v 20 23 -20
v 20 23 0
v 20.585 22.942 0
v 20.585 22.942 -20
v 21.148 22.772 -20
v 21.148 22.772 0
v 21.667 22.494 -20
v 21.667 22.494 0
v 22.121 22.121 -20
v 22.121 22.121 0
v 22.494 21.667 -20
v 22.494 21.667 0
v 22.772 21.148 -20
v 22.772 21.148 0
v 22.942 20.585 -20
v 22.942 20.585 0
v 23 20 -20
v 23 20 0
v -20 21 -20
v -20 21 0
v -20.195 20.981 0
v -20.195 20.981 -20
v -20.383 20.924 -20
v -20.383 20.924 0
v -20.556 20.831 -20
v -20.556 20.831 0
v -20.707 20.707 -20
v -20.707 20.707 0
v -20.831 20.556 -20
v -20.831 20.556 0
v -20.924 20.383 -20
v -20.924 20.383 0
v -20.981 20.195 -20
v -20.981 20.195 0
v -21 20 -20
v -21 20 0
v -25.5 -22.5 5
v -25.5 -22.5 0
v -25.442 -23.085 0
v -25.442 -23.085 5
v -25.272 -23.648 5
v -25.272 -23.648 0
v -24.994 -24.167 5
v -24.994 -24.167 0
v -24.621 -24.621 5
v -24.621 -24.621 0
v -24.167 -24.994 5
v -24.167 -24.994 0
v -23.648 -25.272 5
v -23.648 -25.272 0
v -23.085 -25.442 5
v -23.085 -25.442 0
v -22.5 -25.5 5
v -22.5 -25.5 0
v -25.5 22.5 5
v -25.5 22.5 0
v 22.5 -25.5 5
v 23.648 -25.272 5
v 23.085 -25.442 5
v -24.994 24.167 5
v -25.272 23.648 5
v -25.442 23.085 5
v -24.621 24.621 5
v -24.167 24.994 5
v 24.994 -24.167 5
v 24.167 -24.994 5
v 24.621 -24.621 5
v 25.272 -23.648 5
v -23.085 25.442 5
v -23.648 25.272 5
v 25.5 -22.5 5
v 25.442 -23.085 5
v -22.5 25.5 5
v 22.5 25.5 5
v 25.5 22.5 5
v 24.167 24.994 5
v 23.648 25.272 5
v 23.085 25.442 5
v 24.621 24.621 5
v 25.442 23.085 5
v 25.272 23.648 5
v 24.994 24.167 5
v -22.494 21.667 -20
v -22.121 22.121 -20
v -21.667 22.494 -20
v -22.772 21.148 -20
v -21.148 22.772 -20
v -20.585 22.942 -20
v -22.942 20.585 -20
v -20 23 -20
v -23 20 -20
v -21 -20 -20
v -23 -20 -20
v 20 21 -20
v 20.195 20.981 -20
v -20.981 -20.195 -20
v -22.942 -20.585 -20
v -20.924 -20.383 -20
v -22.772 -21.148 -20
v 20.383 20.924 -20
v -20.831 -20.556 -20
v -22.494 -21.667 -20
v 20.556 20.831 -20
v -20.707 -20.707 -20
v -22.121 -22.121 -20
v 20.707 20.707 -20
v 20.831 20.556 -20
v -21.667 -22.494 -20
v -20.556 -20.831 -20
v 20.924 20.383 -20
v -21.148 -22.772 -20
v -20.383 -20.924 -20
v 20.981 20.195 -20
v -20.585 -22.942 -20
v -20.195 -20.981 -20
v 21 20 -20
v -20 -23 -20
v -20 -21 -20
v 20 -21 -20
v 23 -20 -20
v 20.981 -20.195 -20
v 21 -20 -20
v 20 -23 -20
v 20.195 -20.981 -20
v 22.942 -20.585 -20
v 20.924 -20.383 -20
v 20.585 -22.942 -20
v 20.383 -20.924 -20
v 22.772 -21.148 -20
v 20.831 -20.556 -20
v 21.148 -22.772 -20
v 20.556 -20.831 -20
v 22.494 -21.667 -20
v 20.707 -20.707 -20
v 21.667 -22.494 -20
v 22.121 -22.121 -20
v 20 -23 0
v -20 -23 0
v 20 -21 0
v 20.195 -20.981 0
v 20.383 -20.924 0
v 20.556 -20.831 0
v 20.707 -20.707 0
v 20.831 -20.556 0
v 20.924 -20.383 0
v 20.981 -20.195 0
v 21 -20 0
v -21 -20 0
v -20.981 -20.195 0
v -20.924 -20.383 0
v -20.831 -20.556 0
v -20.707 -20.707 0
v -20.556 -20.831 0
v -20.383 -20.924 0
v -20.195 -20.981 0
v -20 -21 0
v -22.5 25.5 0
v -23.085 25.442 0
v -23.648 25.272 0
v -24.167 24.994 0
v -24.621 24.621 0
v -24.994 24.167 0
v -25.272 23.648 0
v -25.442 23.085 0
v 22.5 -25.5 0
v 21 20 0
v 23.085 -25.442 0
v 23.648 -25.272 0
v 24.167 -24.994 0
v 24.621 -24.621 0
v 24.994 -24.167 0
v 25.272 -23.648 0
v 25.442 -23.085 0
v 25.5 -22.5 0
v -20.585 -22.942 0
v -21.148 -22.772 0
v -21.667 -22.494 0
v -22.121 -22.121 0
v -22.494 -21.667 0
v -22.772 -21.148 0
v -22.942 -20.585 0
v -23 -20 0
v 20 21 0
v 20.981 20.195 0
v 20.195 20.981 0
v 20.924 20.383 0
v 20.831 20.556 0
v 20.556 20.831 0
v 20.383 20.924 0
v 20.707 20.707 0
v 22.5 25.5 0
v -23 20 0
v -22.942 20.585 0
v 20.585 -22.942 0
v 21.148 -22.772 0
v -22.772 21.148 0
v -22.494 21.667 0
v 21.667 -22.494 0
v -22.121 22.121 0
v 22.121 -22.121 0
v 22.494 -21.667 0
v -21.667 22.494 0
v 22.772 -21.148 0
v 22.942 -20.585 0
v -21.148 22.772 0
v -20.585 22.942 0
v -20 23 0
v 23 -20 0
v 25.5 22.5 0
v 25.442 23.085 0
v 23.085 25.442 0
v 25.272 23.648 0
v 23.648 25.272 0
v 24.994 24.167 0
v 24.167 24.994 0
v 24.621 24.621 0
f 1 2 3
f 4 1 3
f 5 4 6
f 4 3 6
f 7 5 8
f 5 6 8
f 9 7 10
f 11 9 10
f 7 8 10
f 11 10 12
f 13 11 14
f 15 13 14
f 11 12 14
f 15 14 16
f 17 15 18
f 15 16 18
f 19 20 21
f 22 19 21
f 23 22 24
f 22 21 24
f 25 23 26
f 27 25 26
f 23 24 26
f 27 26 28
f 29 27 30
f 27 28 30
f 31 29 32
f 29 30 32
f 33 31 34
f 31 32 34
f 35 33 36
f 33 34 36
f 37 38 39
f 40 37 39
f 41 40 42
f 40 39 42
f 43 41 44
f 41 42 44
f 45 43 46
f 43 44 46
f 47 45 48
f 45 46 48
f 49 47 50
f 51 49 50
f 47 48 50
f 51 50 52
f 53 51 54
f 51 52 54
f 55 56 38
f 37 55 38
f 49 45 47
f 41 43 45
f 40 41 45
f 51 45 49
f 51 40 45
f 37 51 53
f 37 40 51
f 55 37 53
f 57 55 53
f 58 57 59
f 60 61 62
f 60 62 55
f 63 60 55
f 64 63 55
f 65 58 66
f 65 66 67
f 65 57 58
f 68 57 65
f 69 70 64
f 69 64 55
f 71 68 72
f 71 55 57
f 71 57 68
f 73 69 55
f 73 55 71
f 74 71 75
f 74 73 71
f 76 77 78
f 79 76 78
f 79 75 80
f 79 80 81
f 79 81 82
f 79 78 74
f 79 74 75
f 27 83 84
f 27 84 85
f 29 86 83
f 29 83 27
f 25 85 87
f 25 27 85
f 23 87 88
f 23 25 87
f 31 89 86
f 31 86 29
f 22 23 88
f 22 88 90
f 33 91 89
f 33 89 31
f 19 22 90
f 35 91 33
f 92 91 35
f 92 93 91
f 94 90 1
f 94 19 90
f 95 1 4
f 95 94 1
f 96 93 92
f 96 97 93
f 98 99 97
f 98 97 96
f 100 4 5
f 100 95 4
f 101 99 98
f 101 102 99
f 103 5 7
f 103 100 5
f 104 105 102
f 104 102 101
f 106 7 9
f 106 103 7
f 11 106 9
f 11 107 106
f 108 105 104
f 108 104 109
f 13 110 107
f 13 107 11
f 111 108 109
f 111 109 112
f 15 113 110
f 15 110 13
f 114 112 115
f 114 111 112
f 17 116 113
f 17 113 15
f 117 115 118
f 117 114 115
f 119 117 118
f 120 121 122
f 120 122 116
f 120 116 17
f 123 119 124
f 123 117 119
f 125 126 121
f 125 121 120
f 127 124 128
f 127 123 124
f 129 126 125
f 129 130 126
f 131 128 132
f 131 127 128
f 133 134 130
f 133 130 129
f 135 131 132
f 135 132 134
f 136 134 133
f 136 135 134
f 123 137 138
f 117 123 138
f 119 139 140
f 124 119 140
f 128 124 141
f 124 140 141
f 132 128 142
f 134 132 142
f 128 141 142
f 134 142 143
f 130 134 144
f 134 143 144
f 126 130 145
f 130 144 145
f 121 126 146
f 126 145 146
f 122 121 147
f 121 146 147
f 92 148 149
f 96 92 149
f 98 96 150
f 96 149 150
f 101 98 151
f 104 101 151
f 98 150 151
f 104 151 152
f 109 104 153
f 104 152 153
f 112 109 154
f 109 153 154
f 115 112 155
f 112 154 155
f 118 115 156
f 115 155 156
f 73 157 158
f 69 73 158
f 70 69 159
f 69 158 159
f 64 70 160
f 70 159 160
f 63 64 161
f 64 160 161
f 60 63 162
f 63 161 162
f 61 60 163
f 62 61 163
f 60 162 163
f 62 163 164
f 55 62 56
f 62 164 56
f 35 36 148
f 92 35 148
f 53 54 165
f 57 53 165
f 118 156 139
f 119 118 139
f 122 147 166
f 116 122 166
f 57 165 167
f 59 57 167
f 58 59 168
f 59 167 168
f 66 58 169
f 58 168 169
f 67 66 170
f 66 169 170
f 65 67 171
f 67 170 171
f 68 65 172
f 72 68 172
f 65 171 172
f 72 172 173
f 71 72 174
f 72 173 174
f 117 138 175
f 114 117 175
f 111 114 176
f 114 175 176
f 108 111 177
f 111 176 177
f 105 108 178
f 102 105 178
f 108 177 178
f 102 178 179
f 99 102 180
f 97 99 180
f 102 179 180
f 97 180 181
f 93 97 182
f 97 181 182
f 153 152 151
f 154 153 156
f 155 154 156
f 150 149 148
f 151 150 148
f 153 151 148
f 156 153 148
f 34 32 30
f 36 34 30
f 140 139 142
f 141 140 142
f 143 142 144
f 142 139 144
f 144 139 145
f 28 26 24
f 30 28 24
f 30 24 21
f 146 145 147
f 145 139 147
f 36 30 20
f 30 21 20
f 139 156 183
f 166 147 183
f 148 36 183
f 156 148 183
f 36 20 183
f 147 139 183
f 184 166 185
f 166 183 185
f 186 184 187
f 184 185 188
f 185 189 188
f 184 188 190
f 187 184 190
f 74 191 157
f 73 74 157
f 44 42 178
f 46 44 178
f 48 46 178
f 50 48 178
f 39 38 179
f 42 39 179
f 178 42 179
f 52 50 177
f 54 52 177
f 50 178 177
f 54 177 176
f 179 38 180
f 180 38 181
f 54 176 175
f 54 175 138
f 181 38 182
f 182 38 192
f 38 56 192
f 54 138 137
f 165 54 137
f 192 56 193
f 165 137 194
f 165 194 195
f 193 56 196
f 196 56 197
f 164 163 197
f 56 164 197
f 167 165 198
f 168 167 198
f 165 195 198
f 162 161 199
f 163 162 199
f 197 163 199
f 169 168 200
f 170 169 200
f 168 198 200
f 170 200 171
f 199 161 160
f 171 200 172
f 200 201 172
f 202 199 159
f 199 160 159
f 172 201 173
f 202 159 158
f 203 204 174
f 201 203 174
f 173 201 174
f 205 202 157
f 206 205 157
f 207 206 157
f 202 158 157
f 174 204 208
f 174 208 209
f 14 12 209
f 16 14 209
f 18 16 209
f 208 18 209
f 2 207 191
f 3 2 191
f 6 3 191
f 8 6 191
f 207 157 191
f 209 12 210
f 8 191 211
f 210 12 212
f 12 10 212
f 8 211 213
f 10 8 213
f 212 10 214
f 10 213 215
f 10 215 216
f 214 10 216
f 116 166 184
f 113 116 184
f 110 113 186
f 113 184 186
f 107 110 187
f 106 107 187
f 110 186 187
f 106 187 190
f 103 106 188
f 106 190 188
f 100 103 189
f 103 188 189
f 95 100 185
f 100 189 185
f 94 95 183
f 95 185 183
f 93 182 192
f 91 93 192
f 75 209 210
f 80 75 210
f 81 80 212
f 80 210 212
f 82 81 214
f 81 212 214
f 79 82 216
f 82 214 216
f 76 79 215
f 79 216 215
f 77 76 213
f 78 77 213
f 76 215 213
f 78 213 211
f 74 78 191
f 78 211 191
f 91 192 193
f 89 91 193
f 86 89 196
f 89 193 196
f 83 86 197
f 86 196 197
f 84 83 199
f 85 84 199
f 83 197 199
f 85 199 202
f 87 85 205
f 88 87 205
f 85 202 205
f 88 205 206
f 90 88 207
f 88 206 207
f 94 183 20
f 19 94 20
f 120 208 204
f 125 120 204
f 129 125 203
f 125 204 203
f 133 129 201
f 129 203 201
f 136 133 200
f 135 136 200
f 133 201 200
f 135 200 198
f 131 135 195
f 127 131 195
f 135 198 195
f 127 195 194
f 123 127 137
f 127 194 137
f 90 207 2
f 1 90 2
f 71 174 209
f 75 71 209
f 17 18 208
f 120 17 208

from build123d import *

# Parameters (mm, degrees)
F1_DEPTH = 5
F3_DEPTH = 20


with BuildPart() as f1:
    # F0 (on Top) → F1 (new body)
    with BuildSketch(Plane.XY):
        with BuildLine():
            ThreePointArc((-25.5, -22.5), (-24.62132, -24.62132), (-22.5, -25.5))
            Line((-22.5, -25.5), (22.5, -25.5))
            ThreePointArc((22.5, -25.5), (24.62132, -24.62132), (25.5, -22.5))
            Line((25.5, -22.5), (25.5, 22.5))
            ThreePointArc((25.5, 22.5), (24.62132, 24.62132), (22.5, 25.5))
            Line((22.5, 25.5), (-22.5, 25.5))
            ThreePointArc((-22.5, 25.5), (-24.62132, 24.62132), (-25.5, 22.5))
            Line((-25.5, 22.5), (-25.5, -22.5))
        make_face()
    extrude(amount=F1_DEPTH)

    # F2 (on face) → F3 (join)
    with BuildSketch(Plane(origin=(0, 0, 0), x_dir=(1, 0, 0), z_dir=(0, 0, -1))):
        with BuildLine():
            ThreePointArc((-23, -20), (-22.12132, -22.12132), (-20, -23))
            Line((-20, -23), (20, -23))
            ThreePointArc((20, -23), (22.12132, -22.12132), (23, -20))
            Line((23, -20), (23, 20))
            ThreePointArc((23, 20), (22.12132, 22.12132), (20, 23))
            Line((20, 23), (-20, 23))
            ThreePointArc((-20, 23), (-22.12132, 22.12132), (-23, 20))
            Line((-23, 20), (-23, -20))
        make_face()
        with BuildLine():
            ThreePointArc((20, 21), (20.707107, 20.707107), (21, 20))
            Line((21, 20), (21, -20))
            ThreePointArc((21, -20), (20.707107, -20.707107), (20, -21))
            Line((20, -21), (-20, -21))
            ThreePointArc((-20, -21), (-20.707107, -20.707107), (-21, -20))
            Line((-21, -20), (-21, 20))
            ThreePointArc((-21, 20), (-20.707107, 20.707107), (-20, 21))
            Line((-20, 21), (20, 21))
        make_face(mode=Mode.SUBTRACT)
    extrude(amount=F3_DEPTH)


solid = f1.part
